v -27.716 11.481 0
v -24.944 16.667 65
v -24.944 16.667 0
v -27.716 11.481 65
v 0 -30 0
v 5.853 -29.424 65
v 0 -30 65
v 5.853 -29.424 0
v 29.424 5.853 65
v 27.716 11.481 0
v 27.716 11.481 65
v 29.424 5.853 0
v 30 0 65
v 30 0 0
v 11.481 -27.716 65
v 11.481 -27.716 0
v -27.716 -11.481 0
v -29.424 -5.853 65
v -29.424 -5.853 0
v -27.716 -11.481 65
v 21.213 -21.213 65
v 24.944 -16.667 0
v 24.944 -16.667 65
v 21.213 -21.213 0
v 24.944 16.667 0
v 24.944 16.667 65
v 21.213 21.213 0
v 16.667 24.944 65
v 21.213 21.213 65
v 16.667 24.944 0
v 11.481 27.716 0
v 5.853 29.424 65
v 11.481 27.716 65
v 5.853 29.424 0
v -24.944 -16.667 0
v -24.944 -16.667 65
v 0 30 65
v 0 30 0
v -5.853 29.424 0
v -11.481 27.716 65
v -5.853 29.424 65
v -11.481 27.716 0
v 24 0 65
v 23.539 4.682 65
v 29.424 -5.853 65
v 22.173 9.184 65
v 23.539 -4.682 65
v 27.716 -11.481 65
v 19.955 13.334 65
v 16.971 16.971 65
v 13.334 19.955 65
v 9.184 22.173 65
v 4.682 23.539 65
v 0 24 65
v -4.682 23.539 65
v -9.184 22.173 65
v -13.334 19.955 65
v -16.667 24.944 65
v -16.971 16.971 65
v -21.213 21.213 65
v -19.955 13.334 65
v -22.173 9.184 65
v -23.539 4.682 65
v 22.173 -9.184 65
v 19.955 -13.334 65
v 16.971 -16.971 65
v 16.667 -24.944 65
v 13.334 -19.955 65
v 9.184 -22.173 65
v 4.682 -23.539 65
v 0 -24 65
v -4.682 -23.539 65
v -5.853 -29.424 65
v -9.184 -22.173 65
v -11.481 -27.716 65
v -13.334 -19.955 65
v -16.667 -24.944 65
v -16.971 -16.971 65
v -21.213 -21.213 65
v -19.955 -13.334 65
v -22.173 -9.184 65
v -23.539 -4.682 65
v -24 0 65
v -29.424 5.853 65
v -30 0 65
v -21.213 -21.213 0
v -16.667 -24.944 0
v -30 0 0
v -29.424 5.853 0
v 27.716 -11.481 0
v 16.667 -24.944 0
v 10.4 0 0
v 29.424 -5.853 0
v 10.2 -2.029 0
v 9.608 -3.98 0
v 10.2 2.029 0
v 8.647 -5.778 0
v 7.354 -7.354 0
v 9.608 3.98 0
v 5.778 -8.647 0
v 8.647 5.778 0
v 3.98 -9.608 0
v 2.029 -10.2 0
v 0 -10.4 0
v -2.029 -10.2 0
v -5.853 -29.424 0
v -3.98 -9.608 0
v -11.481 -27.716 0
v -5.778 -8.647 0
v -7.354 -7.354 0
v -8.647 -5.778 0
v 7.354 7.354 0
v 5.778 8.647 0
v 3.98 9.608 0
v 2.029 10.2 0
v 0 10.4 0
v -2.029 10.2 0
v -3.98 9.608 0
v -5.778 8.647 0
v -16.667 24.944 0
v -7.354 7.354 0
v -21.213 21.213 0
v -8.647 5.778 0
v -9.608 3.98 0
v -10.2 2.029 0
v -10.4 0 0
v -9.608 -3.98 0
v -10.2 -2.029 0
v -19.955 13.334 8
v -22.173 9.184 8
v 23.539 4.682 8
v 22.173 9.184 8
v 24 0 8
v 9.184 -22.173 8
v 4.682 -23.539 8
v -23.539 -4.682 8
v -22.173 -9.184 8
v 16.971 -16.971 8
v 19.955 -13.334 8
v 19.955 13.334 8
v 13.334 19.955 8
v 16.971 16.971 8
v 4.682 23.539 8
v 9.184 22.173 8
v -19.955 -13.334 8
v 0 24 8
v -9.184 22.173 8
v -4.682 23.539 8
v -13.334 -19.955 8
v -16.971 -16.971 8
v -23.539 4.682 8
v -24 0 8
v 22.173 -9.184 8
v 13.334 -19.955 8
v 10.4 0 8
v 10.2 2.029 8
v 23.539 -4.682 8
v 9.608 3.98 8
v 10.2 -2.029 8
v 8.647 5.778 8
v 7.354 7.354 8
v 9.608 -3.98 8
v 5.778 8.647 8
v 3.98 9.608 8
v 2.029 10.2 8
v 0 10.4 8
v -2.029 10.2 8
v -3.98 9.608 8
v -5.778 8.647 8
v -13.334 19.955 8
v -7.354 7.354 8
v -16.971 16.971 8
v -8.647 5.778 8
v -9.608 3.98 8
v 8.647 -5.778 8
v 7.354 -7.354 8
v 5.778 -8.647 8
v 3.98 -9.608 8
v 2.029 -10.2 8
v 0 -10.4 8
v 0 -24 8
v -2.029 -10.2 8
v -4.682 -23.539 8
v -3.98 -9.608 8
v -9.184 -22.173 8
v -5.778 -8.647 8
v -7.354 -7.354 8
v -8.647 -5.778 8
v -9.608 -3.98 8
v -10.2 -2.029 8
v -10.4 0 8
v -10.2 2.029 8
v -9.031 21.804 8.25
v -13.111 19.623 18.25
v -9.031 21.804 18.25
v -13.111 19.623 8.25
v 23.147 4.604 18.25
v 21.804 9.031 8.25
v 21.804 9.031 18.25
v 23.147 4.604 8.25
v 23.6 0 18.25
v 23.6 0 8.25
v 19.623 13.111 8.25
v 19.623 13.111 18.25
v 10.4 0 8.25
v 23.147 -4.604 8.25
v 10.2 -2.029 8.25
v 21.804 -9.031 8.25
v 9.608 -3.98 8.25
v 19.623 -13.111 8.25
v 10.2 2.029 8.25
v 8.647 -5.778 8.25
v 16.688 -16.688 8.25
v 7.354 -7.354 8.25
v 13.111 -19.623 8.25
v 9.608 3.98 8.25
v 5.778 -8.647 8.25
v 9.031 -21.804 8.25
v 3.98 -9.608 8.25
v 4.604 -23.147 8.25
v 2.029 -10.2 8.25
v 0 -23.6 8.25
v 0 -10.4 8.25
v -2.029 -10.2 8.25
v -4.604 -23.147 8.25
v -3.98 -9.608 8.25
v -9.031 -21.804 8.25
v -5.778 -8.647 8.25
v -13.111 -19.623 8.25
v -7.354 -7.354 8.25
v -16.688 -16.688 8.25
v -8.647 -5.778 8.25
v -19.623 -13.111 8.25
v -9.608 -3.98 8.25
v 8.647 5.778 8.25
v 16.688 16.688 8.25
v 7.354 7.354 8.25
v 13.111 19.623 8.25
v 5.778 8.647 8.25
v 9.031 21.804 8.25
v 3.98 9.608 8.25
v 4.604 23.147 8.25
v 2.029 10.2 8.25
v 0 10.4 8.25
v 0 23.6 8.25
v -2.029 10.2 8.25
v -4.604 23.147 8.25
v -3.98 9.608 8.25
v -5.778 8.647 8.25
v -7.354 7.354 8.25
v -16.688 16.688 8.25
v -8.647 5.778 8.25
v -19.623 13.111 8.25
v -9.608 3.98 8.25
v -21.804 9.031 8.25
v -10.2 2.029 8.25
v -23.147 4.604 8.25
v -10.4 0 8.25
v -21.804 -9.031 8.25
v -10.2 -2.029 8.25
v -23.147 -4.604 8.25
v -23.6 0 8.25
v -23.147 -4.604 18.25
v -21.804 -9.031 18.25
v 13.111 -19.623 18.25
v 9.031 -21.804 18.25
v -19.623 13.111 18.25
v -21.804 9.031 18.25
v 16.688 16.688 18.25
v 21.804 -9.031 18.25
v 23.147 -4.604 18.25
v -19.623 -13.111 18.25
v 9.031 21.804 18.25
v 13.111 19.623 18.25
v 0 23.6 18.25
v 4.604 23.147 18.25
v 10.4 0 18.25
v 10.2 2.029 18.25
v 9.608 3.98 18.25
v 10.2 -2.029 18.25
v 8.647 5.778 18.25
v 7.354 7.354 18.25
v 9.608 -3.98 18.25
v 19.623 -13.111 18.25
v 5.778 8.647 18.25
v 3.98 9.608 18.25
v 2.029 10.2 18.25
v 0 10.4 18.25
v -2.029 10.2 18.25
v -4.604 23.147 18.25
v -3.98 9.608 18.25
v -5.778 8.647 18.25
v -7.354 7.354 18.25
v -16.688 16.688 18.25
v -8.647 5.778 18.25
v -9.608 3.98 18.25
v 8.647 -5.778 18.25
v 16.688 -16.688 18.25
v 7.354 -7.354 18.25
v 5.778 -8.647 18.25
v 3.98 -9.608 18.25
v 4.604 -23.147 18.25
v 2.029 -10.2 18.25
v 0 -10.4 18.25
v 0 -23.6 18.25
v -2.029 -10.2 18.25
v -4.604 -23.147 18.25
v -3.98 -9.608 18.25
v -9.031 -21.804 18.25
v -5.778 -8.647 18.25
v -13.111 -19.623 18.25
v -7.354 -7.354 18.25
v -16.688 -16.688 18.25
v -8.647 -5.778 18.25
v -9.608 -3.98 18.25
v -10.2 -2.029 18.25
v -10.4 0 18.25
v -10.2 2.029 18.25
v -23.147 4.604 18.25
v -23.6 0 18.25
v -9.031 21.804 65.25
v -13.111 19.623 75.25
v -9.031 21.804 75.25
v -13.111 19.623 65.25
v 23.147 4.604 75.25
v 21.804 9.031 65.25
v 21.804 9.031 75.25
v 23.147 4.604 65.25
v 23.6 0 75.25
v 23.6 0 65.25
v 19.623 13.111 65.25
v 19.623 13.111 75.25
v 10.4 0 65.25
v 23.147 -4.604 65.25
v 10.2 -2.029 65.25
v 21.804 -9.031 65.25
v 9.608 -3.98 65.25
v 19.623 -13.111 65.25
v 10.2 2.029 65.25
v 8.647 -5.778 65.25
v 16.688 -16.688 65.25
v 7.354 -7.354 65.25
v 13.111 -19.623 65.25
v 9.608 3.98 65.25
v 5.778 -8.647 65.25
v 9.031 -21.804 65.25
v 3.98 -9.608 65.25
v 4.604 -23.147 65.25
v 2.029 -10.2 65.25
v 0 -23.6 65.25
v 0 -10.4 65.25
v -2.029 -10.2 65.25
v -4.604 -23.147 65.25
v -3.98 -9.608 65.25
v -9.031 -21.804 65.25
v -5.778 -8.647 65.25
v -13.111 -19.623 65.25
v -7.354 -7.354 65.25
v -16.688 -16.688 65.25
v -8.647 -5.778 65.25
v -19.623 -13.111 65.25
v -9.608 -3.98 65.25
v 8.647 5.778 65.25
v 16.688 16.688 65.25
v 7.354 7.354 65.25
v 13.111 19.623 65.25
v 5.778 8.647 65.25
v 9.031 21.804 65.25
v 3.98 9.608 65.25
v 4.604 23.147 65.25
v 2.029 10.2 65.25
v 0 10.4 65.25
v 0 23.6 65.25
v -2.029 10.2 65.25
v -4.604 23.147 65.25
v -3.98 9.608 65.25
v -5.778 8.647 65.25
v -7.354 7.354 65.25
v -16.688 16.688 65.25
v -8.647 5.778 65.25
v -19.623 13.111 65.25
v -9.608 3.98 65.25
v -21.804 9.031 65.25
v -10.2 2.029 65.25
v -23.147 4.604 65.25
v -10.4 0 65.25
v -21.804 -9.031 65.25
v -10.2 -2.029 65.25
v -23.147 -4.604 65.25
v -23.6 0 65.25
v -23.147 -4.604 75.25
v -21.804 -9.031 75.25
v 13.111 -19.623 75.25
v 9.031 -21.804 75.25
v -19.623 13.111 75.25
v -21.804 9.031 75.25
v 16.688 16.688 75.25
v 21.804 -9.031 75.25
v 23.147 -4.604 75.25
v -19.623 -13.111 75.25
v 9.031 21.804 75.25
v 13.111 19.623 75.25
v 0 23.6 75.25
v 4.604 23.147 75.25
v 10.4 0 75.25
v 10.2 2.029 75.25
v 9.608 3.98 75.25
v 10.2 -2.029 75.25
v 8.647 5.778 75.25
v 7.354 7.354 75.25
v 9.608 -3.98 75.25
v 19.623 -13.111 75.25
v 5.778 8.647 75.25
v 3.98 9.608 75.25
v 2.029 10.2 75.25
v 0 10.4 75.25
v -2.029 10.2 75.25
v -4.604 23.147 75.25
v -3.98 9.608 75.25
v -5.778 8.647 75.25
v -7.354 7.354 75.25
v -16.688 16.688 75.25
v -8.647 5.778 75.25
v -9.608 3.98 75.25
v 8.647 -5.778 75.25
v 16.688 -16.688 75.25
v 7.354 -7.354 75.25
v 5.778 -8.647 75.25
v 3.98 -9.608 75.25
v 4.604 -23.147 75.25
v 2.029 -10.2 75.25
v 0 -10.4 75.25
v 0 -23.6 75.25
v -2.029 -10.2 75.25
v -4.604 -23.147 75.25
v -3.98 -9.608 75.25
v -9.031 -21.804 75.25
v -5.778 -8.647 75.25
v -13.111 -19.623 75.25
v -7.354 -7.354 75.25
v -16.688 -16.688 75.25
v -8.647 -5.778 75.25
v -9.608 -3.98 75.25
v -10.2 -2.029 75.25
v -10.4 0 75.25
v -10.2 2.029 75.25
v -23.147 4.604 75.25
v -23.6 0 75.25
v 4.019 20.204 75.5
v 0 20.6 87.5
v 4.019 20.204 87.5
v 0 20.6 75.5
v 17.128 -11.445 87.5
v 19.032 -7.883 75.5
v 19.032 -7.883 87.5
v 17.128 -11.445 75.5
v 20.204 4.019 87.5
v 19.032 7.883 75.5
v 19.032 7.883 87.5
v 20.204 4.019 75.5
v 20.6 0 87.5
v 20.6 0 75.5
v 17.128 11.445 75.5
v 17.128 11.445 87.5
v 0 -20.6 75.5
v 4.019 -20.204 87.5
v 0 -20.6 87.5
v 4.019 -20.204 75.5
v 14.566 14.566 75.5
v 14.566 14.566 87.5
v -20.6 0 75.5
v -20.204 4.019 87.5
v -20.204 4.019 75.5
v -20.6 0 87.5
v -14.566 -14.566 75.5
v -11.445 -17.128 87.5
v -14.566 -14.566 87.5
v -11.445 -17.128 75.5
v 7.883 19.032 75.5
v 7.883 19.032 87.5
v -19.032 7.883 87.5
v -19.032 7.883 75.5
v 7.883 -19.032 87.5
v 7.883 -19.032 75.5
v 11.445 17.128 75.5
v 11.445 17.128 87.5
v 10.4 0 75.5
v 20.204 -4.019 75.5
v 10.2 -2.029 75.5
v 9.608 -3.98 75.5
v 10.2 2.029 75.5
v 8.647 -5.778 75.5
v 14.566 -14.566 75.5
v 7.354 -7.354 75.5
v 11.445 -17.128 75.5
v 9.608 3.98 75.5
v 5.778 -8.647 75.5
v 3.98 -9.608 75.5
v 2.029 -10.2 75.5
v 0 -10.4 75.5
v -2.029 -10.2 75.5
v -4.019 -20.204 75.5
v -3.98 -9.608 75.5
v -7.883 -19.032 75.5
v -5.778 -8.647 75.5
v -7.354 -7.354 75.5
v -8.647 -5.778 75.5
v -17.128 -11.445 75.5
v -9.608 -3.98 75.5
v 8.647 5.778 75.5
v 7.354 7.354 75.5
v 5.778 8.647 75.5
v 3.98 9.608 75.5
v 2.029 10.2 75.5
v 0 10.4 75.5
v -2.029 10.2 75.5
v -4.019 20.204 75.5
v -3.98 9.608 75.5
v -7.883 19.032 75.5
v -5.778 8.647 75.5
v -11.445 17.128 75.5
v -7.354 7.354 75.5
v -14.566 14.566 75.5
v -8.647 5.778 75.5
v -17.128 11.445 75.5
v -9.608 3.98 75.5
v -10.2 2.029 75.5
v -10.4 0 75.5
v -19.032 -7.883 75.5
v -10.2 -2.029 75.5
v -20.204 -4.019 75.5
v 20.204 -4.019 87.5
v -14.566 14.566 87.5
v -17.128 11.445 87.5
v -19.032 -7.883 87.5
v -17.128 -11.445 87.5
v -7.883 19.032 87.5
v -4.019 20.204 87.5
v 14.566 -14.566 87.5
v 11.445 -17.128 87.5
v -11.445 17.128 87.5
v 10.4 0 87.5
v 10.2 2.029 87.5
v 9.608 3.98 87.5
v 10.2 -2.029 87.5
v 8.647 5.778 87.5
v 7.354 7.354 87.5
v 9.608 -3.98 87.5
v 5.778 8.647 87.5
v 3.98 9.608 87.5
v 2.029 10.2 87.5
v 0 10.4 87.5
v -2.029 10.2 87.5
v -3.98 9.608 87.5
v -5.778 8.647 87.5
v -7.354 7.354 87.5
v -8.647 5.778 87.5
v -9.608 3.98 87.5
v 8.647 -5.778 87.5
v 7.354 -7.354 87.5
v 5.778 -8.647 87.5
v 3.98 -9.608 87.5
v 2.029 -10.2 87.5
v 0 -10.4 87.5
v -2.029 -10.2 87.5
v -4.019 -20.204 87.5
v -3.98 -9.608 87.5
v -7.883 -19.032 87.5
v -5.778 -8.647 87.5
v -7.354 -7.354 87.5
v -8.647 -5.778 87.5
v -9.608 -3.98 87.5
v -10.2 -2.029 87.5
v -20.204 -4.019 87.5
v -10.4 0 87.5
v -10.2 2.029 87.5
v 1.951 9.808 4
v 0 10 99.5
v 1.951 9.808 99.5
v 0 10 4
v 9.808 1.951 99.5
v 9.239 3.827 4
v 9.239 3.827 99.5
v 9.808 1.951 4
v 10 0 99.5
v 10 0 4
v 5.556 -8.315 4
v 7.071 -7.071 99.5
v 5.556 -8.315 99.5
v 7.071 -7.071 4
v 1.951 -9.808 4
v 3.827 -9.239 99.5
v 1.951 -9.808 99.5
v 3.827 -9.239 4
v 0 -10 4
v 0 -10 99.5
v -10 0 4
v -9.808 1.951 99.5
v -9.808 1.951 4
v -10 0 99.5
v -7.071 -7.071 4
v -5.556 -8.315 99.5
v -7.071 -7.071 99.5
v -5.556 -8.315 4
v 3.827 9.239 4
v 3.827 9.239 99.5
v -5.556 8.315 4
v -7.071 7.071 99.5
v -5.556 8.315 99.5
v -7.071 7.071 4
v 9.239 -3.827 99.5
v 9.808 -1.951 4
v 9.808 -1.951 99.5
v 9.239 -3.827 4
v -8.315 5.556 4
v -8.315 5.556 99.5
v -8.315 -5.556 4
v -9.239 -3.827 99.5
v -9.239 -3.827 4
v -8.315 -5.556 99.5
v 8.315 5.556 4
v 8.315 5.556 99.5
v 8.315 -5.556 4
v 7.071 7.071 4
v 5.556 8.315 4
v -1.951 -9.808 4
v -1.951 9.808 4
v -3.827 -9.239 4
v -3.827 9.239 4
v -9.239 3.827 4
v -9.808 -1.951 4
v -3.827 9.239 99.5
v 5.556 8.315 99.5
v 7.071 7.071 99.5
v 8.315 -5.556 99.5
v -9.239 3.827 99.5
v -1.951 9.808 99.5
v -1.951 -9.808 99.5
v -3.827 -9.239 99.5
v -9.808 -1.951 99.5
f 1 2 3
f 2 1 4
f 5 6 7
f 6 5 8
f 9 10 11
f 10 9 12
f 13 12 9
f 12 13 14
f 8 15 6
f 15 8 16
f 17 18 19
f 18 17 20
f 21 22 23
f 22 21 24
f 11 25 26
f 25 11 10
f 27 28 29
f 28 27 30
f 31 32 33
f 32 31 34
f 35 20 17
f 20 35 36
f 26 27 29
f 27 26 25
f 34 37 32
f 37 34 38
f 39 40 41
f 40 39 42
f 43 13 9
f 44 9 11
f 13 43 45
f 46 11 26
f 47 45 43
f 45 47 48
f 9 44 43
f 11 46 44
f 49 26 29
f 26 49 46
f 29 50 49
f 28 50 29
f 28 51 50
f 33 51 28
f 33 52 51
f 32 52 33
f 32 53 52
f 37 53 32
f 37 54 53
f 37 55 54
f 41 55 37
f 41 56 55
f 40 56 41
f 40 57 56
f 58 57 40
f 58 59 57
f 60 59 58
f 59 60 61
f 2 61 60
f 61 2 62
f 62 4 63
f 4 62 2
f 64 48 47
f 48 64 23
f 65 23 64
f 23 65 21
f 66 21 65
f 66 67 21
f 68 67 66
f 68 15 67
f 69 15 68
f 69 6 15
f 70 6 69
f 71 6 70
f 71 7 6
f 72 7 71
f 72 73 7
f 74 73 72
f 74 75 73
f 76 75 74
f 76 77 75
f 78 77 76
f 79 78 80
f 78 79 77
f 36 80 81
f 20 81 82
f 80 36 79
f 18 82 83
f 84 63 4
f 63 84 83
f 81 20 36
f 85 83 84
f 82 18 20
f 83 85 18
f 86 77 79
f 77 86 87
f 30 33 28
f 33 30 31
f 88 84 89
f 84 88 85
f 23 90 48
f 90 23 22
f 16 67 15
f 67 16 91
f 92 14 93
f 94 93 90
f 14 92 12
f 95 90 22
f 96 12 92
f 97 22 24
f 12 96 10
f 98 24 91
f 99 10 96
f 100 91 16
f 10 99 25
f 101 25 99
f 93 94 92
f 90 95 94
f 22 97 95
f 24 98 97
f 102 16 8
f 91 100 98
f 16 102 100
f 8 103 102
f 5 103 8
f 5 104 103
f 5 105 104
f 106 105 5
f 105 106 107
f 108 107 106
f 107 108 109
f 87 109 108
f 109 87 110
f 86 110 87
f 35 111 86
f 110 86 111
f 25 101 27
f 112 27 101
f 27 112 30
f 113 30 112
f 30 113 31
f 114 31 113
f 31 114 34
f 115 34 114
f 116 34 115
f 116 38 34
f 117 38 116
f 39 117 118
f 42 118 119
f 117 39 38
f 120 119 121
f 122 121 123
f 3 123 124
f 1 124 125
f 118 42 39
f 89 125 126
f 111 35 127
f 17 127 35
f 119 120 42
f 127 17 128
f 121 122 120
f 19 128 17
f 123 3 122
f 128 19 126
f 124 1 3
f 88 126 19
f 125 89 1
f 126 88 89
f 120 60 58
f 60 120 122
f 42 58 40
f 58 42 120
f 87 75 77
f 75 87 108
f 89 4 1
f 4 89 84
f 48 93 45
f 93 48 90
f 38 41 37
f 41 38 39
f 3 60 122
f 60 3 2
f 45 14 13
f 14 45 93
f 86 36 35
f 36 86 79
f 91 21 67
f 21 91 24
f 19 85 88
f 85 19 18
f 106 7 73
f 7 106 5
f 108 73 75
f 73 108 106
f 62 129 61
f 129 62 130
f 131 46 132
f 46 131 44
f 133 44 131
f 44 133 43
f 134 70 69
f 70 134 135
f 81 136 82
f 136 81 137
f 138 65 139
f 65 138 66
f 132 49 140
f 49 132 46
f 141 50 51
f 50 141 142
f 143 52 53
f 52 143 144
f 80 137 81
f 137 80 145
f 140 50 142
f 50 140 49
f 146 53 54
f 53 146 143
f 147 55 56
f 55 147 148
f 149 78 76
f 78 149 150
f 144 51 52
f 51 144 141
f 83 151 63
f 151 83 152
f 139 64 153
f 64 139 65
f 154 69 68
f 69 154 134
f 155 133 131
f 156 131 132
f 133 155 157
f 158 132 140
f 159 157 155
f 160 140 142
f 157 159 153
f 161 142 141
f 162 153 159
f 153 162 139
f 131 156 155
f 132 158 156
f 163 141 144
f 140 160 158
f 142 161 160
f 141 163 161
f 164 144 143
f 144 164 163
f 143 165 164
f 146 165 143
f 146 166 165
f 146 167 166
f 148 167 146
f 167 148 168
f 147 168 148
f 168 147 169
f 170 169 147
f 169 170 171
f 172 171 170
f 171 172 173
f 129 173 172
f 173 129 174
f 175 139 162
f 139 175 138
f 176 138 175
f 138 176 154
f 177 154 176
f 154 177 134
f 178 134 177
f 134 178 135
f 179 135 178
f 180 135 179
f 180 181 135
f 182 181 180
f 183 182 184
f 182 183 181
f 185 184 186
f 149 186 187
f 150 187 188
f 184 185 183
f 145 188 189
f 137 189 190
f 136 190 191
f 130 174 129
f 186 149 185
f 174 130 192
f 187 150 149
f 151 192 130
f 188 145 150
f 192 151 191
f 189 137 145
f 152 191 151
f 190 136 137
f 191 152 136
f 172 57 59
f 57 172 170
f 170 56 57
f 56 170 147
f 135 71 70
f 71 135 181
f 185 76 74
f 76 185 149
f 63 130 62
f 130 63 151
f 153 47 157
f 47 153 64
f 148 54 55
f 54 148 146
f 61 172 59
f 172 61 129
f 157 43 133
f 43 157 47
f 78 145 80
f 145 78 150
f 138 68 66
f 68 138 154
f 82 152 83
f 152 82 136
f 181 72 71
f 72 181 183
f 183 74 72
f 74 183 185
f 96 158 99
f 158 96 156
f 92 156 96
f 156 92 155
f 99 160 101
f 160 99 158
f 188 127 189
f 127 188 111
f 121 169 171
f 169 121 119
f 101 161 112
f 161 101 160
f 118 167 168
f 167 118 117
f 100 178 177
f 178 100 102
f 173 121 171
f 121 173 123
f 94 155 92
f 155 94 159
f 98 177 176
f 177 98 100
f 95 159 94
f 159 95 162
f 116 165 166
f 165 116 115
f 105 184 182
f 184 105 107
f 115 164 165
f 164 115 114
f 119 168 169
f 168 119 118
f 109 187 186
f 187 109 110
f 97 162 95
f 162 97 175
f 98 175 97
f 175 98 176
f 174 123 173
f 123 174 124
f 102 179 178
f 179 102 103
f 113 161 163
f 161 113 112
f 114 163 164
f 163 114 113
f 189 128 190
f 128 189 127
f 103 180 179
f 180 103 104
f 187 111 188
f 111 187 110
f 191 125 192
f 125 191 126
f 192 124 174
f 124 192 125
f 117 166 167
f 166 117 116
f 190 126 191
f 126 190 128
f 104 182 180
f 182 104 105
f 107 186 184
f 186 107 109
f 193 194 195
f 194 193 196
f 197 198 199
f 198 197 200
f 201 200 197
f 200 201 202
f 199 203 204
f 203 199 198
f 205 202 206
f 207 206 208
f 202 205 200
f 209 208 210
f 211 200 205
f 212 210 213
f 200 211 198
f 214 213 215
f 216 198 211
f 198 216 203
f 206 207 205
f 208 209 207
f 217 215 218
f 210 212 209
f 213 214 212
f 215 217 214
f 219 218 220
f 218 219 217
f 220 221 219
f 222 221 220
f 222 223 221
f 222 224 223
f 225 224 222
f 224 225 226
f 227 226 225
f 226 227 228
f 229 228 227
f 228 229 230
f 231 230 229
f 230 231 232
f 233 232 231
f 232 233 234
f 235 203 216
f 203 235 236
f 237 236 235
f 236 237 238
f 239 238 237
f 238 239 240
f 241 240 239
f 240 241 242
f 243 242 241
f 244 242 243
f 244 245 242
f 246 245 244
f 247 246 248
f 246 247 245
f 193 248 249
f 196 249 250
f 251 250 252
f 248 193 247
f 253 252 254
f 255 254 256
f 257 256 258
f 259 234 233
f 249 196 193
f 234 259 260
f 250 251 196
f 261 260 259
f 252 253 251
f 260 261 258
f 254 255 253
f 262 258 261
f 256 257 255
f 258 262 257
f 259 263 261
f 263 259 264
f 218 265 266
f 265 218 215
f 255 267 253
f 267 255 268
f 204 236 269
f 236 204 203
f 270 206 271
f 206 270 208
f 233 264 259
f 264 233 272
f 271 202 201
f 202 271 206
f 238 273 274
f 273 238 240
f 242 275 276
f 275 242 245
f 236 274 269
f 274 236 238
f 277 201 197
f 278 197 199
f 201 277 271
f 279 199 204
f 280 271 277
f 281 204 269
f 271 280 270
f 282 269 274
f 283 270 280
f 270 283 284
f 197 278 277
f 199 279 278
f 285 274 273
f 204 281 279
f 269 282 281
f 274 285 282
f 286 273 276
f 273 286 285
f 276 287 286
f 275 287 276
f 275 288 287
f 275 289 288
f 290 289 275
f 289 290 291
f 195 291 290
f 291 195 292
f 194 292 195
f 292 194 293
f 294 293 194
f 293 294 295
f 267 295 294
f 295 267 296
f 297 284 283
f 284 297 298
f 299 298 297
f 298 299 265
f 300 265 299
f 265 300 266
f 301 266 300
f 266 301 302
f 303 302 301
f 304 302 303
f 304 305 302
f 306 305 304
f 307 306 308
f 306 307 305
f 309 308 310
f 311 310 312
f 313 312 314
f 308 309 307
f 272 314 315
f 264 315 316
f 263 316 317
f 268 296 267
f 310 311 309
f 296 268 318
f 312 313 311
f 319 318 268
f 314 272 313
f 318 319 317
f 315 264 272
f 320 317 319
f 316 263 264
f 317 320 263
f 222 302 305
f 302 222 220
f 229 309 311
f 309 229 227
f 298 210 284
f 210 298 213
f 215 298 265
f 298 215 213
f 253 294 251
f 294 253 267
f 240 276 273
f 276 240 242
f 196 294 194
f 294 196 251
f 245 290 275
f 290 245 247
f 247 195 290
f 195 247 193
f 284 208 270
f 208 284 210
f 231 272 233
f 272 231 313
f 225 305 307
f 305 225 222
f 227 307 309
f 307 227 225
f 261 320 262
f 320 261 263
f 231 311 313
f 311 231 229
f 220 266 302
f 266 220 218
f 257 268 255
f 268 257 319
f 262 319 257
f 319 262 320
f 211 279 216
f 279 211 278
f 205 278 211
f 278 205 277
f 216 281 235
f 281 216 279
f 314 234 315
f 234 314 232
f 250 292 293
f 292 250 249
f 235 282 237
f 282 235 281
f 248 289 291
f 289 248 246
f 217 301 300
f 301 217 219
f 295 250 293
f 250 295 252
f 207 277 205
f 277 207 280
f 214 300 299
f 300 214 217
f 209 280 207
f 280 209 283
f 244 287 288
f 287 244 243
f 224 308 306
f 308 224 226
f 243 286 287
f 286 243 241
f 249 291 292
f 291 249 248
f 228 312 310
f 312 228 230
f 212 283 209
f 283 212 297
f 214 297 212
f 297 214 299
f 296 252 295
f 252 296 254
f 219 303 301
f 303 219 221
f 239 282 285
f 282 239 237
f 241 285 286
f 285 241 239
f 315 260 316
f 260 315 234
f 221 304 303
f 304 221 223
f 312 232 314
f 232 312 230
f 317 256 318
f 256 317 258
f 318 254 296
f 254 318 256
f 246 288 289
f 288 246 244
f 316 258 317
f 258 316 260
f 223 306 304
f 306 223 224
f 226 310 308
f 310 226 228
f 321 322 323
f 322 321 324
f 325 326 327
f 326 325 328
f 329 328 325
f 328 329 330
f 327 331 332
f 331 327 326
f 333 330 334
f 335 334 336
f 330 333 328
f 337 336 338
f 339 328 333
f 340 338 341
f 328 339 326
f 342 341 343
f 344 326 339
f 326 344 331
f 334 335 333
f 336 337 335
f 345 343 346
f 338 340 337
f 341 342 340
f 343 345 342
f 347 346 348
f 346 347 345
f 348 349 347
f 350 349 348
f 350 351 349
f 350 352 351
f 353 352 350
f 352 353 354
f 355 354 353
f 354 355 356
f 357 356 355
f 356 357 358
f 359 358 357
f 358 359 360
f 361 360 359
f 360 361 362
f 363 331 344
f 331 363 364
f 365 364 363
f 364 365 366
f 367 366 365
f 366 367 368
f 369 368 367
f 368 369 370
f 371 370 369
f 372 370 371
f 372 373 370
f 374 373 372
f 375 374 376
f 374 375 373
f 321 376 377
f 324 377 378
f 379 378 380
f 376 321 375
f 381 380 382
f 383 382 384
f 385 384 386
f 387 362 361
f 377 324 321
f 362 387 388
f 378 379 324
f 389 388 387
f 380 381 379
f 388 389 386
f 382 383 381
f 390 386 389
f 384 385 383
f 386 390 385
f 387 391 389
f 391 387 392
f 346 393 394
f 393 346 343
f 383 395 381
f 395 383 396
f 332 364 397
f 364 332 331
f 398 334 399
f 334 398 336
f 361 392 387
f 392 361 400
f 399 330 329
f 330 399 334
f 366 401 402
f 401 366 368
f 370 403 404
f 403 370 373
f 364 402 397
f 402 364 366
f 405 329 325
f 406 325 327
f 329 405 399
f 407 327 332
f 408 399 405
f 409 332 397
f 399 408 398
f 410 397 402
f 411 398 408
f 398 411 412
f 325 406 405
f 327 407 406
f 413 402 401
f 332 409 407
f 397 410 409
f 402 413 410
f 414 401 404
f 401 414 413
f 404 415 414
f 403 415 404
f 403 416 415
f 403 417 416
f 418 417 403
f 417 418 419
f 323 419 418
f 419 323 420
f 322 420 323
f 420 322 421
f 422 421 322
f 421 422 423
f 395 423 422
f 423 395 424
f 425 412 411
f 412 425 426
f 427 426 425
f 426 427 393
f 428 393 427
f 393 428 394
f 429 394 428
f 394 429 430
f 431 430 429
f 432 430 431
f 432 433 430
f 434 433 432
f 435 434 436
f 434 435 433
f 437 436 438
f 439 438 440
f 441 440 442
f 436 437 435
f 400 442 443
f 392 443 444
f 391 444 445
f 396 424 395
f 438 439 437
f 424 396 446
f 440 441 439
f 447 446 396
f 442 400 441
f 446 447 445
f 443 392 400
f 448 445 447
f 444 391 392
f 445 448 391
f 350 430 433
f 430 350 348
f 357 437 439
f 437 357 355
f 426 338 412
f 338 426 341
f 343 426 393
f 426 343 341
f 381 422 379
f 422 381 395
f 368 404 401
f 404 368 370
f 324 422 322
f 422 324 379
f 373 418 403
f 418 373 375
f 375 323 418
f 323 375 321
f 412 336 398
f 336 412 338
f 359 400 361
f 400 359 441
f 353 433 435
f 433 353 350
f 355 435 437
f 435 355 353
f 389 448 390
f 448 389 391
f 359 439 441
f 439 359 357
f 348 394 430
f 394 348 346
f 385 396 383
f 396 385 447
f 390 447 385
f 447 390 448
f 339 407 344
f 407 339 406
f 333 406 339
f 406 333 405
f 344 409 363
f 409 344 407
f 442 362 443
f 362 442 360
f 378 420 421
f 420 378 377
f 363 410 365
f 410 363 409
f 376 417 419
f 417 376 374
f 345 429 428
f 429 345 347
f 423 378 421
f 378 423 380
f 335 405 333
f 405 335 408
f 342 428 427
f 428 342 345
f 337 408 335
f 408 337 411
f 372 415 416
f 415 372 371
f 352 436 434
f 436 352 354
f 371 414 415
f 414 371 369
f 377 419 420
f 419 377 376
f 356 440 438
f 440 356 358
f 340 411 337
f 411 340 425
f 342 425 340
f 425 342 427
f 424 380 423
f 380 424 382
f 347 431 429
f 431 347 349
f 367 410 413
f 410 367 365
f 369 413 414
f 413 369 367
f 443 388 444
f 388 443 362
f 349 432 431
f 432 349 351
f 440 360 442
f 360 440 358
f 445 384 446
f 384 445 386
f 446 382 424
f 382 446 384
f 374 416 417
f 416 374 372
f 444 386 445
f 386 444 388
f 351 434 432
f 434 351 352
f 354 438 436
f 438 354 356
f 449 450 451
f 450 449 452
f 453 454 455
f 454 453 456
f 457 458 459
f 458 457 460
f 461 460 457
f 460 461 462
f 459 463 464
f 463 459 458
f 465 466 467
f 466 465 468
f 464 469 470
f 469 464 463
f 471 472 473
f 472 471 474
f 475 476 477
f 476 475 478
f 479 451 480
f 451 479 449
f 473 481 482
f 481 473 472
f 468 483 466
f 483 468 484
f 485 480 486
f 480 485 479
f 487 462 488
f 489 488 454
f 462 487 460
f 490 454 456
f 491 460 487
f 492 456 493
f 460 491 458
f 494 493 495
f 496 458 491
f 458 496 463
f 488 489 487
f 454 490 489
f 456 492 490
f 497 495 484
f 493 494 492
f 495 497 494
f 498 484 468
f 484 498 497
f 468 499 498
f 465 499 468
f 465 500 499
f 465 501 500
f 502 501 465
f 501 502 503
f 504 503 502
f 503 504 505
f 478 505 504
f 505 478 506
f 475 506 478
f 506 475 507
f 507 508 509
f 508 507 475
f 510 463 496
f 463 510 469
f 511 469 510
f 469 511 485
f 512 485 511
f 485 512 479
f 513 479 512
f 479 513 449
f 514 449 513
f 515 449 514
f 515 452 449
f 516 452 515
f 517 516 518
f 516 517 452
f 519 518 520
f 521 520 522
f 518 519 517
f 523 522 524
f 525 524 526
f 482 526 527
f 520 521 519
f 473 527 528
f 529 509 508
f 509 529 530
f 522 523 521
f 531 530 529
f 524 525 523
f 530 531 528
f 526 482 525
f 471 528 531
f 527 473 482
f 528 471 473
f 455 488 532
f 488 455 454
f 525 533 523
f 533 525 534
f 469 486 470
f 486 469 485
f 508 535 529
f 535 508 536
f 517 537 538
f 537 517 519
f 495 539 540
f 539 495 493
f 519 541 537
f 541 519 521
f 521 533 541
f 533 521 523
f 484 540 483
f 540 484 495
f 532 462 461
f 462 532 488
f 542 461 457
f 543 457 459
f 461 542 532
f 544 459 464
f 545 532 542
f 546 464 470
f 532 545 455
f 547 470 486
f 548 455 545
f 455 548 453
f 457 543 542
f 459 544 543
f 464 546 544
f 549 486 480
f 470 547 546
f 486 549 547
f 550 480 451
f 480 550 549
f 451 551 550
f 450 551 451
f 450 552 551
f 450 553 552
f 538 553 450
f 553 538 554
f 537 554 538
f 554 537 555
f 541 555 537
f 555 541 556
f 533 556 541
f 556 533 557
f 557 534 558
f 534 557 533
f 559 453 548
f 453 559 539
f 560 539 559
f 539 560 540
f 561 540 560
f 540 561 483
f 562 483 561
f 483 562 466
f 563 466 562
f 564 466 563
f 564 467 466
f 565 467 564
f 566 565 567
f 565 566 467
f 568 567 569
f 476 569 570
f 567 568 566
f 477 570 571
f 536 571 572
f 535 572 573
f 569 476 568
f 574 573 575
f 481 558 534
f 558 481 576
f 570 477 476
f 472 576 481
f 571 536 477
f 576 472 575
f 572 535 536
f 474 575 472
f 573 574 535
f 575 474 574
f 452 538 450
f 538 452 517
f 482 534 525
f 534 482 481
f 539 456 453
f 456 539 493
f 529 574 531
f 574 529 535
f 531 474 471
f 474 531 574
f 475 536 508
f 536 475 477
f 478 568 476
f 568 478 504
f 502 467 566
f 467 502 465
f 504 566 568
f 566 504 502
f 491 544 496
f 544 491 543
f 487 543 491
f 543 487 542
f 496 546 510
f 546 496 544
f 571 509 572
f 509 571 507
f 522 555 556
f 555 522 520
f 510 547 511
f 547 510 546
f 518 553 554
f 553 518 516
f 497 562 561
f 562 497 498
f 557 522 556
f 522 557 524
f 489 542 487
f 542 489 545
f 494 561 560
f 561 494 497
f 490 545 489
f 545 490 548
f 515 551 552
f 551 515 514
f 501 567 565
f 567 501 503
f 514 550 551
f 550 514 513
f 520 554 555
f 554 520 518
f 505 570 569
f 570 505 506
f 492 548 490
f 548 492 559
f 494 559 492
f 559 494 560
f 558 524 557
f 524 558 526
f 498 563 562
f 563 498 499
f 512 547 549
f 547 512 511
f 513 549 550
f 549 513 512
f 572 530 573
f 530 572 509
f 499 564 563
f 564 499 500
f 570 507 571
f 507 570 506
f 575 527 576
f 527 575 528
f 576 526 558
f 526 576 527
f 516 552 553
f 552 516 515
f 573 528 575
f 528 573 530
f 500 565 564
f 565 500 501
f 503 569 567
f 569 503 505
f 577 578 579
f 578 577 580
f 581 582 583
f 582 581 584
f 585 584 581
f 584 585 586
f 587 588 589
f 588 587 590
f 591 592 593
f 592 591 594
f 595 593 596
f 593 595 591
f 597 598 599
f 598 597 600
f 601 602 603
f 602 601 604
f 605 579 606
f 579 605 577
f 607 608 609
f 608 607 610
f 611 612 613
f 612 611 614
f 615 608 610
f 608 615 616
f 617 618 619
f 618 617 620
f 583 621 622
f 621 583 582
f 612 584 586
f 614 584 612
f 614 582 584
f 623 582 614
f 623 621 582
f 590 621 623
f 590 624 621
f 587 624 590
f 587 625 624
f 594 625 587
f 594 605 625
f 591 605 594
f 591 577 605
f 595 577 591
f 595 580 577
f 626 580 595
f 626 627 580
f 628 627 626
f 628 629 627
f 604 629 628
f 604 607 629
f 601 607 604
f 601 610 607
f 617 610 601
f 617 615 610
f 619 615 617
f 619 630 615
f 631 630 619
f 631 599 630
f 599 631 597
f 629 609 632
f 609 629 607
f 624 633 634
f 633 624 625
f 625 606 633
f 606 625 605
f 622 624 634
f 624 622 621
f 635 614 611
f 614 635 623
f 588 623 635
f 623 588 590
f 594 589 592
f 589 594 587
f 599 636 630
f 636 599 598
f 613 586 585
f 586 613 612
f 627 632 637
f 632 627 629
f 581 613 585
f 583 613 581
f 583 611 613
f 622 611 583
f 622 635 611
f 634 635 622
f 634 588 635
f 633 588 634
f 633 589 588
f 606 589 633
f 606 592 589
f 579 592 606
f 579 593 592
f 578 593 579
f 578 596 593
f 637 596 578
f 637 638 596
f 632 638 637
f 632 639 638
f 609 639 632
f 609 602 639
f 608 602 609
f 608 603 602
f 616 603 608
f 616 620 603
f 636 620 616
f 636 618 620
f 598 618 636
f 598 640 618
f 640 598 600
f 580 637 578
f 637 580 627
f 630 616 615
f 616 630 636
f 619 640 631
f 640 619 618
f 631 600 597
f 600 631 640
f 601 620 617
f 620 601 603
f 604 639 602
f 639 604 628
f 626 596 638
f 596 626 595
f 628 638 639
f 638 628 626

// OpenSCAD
$fn = 32;

// ------------------------------------------------------------------------
// Bearing housing: housing d60, two bearings and a shaft
// Every part is its own module, assembly() places them once.
// ------------------------------------------------------------------------

// --- part 1 ---
module housing() {
  difference() {
    cylinder(h = 65, d = 60);
    translate([0, 0, 8]) cylinder(h = 58, d = 48);
    translate([0, 0, -1]) cylinder(h = 10, d = 20.8);
  }
}

// --- part 2 ---
module bearing_lower() {
  difference() {
      translate([0, 0, 0]) cylinder(h = 10, d = 47.2);
      translate([0, 0, -1]) cylinder(h = 12, d = 20.8);
    }
}

// --- part 3 ---
module bearing_upper() {
  difference() {
      translate([0, 0, 0]) cylinder(h = 10, d = 47.2);
      translate([0, 0, -1]) cylinder(h = 12, d = 20.8);
    }
}

// --- part 4 ---
module spacer() {
  difference() {
      translate([0, 0, 0]) cylinder(h = 12, d = 41.2);
      translate([0, 0, -1]) cylinder(h = 14, d = 20.8);
    }
}

// --- part 5 ---
module shaft() {
  translate([0, 0, -47.75]) cylinder(h = 95.5, d = 20);
}

// --- assembly ---
module assembly() {
  translate([0, 0, 0]) rotate([0, 0, 0]) housing();
  translate([0, 0, 8.25]) rotate([0, 0, 0]) bearing_lower();
  translate([0, 0, 65.25]) rotate([0, 0, 0]) bearing_upper();
  translate([0, 0, 75.5]) rotate([0, 0, 0]) spacer();
  translate([0, 0, 51.75]) rotate([0, 0, 0]) shaft();
}

assembly();
